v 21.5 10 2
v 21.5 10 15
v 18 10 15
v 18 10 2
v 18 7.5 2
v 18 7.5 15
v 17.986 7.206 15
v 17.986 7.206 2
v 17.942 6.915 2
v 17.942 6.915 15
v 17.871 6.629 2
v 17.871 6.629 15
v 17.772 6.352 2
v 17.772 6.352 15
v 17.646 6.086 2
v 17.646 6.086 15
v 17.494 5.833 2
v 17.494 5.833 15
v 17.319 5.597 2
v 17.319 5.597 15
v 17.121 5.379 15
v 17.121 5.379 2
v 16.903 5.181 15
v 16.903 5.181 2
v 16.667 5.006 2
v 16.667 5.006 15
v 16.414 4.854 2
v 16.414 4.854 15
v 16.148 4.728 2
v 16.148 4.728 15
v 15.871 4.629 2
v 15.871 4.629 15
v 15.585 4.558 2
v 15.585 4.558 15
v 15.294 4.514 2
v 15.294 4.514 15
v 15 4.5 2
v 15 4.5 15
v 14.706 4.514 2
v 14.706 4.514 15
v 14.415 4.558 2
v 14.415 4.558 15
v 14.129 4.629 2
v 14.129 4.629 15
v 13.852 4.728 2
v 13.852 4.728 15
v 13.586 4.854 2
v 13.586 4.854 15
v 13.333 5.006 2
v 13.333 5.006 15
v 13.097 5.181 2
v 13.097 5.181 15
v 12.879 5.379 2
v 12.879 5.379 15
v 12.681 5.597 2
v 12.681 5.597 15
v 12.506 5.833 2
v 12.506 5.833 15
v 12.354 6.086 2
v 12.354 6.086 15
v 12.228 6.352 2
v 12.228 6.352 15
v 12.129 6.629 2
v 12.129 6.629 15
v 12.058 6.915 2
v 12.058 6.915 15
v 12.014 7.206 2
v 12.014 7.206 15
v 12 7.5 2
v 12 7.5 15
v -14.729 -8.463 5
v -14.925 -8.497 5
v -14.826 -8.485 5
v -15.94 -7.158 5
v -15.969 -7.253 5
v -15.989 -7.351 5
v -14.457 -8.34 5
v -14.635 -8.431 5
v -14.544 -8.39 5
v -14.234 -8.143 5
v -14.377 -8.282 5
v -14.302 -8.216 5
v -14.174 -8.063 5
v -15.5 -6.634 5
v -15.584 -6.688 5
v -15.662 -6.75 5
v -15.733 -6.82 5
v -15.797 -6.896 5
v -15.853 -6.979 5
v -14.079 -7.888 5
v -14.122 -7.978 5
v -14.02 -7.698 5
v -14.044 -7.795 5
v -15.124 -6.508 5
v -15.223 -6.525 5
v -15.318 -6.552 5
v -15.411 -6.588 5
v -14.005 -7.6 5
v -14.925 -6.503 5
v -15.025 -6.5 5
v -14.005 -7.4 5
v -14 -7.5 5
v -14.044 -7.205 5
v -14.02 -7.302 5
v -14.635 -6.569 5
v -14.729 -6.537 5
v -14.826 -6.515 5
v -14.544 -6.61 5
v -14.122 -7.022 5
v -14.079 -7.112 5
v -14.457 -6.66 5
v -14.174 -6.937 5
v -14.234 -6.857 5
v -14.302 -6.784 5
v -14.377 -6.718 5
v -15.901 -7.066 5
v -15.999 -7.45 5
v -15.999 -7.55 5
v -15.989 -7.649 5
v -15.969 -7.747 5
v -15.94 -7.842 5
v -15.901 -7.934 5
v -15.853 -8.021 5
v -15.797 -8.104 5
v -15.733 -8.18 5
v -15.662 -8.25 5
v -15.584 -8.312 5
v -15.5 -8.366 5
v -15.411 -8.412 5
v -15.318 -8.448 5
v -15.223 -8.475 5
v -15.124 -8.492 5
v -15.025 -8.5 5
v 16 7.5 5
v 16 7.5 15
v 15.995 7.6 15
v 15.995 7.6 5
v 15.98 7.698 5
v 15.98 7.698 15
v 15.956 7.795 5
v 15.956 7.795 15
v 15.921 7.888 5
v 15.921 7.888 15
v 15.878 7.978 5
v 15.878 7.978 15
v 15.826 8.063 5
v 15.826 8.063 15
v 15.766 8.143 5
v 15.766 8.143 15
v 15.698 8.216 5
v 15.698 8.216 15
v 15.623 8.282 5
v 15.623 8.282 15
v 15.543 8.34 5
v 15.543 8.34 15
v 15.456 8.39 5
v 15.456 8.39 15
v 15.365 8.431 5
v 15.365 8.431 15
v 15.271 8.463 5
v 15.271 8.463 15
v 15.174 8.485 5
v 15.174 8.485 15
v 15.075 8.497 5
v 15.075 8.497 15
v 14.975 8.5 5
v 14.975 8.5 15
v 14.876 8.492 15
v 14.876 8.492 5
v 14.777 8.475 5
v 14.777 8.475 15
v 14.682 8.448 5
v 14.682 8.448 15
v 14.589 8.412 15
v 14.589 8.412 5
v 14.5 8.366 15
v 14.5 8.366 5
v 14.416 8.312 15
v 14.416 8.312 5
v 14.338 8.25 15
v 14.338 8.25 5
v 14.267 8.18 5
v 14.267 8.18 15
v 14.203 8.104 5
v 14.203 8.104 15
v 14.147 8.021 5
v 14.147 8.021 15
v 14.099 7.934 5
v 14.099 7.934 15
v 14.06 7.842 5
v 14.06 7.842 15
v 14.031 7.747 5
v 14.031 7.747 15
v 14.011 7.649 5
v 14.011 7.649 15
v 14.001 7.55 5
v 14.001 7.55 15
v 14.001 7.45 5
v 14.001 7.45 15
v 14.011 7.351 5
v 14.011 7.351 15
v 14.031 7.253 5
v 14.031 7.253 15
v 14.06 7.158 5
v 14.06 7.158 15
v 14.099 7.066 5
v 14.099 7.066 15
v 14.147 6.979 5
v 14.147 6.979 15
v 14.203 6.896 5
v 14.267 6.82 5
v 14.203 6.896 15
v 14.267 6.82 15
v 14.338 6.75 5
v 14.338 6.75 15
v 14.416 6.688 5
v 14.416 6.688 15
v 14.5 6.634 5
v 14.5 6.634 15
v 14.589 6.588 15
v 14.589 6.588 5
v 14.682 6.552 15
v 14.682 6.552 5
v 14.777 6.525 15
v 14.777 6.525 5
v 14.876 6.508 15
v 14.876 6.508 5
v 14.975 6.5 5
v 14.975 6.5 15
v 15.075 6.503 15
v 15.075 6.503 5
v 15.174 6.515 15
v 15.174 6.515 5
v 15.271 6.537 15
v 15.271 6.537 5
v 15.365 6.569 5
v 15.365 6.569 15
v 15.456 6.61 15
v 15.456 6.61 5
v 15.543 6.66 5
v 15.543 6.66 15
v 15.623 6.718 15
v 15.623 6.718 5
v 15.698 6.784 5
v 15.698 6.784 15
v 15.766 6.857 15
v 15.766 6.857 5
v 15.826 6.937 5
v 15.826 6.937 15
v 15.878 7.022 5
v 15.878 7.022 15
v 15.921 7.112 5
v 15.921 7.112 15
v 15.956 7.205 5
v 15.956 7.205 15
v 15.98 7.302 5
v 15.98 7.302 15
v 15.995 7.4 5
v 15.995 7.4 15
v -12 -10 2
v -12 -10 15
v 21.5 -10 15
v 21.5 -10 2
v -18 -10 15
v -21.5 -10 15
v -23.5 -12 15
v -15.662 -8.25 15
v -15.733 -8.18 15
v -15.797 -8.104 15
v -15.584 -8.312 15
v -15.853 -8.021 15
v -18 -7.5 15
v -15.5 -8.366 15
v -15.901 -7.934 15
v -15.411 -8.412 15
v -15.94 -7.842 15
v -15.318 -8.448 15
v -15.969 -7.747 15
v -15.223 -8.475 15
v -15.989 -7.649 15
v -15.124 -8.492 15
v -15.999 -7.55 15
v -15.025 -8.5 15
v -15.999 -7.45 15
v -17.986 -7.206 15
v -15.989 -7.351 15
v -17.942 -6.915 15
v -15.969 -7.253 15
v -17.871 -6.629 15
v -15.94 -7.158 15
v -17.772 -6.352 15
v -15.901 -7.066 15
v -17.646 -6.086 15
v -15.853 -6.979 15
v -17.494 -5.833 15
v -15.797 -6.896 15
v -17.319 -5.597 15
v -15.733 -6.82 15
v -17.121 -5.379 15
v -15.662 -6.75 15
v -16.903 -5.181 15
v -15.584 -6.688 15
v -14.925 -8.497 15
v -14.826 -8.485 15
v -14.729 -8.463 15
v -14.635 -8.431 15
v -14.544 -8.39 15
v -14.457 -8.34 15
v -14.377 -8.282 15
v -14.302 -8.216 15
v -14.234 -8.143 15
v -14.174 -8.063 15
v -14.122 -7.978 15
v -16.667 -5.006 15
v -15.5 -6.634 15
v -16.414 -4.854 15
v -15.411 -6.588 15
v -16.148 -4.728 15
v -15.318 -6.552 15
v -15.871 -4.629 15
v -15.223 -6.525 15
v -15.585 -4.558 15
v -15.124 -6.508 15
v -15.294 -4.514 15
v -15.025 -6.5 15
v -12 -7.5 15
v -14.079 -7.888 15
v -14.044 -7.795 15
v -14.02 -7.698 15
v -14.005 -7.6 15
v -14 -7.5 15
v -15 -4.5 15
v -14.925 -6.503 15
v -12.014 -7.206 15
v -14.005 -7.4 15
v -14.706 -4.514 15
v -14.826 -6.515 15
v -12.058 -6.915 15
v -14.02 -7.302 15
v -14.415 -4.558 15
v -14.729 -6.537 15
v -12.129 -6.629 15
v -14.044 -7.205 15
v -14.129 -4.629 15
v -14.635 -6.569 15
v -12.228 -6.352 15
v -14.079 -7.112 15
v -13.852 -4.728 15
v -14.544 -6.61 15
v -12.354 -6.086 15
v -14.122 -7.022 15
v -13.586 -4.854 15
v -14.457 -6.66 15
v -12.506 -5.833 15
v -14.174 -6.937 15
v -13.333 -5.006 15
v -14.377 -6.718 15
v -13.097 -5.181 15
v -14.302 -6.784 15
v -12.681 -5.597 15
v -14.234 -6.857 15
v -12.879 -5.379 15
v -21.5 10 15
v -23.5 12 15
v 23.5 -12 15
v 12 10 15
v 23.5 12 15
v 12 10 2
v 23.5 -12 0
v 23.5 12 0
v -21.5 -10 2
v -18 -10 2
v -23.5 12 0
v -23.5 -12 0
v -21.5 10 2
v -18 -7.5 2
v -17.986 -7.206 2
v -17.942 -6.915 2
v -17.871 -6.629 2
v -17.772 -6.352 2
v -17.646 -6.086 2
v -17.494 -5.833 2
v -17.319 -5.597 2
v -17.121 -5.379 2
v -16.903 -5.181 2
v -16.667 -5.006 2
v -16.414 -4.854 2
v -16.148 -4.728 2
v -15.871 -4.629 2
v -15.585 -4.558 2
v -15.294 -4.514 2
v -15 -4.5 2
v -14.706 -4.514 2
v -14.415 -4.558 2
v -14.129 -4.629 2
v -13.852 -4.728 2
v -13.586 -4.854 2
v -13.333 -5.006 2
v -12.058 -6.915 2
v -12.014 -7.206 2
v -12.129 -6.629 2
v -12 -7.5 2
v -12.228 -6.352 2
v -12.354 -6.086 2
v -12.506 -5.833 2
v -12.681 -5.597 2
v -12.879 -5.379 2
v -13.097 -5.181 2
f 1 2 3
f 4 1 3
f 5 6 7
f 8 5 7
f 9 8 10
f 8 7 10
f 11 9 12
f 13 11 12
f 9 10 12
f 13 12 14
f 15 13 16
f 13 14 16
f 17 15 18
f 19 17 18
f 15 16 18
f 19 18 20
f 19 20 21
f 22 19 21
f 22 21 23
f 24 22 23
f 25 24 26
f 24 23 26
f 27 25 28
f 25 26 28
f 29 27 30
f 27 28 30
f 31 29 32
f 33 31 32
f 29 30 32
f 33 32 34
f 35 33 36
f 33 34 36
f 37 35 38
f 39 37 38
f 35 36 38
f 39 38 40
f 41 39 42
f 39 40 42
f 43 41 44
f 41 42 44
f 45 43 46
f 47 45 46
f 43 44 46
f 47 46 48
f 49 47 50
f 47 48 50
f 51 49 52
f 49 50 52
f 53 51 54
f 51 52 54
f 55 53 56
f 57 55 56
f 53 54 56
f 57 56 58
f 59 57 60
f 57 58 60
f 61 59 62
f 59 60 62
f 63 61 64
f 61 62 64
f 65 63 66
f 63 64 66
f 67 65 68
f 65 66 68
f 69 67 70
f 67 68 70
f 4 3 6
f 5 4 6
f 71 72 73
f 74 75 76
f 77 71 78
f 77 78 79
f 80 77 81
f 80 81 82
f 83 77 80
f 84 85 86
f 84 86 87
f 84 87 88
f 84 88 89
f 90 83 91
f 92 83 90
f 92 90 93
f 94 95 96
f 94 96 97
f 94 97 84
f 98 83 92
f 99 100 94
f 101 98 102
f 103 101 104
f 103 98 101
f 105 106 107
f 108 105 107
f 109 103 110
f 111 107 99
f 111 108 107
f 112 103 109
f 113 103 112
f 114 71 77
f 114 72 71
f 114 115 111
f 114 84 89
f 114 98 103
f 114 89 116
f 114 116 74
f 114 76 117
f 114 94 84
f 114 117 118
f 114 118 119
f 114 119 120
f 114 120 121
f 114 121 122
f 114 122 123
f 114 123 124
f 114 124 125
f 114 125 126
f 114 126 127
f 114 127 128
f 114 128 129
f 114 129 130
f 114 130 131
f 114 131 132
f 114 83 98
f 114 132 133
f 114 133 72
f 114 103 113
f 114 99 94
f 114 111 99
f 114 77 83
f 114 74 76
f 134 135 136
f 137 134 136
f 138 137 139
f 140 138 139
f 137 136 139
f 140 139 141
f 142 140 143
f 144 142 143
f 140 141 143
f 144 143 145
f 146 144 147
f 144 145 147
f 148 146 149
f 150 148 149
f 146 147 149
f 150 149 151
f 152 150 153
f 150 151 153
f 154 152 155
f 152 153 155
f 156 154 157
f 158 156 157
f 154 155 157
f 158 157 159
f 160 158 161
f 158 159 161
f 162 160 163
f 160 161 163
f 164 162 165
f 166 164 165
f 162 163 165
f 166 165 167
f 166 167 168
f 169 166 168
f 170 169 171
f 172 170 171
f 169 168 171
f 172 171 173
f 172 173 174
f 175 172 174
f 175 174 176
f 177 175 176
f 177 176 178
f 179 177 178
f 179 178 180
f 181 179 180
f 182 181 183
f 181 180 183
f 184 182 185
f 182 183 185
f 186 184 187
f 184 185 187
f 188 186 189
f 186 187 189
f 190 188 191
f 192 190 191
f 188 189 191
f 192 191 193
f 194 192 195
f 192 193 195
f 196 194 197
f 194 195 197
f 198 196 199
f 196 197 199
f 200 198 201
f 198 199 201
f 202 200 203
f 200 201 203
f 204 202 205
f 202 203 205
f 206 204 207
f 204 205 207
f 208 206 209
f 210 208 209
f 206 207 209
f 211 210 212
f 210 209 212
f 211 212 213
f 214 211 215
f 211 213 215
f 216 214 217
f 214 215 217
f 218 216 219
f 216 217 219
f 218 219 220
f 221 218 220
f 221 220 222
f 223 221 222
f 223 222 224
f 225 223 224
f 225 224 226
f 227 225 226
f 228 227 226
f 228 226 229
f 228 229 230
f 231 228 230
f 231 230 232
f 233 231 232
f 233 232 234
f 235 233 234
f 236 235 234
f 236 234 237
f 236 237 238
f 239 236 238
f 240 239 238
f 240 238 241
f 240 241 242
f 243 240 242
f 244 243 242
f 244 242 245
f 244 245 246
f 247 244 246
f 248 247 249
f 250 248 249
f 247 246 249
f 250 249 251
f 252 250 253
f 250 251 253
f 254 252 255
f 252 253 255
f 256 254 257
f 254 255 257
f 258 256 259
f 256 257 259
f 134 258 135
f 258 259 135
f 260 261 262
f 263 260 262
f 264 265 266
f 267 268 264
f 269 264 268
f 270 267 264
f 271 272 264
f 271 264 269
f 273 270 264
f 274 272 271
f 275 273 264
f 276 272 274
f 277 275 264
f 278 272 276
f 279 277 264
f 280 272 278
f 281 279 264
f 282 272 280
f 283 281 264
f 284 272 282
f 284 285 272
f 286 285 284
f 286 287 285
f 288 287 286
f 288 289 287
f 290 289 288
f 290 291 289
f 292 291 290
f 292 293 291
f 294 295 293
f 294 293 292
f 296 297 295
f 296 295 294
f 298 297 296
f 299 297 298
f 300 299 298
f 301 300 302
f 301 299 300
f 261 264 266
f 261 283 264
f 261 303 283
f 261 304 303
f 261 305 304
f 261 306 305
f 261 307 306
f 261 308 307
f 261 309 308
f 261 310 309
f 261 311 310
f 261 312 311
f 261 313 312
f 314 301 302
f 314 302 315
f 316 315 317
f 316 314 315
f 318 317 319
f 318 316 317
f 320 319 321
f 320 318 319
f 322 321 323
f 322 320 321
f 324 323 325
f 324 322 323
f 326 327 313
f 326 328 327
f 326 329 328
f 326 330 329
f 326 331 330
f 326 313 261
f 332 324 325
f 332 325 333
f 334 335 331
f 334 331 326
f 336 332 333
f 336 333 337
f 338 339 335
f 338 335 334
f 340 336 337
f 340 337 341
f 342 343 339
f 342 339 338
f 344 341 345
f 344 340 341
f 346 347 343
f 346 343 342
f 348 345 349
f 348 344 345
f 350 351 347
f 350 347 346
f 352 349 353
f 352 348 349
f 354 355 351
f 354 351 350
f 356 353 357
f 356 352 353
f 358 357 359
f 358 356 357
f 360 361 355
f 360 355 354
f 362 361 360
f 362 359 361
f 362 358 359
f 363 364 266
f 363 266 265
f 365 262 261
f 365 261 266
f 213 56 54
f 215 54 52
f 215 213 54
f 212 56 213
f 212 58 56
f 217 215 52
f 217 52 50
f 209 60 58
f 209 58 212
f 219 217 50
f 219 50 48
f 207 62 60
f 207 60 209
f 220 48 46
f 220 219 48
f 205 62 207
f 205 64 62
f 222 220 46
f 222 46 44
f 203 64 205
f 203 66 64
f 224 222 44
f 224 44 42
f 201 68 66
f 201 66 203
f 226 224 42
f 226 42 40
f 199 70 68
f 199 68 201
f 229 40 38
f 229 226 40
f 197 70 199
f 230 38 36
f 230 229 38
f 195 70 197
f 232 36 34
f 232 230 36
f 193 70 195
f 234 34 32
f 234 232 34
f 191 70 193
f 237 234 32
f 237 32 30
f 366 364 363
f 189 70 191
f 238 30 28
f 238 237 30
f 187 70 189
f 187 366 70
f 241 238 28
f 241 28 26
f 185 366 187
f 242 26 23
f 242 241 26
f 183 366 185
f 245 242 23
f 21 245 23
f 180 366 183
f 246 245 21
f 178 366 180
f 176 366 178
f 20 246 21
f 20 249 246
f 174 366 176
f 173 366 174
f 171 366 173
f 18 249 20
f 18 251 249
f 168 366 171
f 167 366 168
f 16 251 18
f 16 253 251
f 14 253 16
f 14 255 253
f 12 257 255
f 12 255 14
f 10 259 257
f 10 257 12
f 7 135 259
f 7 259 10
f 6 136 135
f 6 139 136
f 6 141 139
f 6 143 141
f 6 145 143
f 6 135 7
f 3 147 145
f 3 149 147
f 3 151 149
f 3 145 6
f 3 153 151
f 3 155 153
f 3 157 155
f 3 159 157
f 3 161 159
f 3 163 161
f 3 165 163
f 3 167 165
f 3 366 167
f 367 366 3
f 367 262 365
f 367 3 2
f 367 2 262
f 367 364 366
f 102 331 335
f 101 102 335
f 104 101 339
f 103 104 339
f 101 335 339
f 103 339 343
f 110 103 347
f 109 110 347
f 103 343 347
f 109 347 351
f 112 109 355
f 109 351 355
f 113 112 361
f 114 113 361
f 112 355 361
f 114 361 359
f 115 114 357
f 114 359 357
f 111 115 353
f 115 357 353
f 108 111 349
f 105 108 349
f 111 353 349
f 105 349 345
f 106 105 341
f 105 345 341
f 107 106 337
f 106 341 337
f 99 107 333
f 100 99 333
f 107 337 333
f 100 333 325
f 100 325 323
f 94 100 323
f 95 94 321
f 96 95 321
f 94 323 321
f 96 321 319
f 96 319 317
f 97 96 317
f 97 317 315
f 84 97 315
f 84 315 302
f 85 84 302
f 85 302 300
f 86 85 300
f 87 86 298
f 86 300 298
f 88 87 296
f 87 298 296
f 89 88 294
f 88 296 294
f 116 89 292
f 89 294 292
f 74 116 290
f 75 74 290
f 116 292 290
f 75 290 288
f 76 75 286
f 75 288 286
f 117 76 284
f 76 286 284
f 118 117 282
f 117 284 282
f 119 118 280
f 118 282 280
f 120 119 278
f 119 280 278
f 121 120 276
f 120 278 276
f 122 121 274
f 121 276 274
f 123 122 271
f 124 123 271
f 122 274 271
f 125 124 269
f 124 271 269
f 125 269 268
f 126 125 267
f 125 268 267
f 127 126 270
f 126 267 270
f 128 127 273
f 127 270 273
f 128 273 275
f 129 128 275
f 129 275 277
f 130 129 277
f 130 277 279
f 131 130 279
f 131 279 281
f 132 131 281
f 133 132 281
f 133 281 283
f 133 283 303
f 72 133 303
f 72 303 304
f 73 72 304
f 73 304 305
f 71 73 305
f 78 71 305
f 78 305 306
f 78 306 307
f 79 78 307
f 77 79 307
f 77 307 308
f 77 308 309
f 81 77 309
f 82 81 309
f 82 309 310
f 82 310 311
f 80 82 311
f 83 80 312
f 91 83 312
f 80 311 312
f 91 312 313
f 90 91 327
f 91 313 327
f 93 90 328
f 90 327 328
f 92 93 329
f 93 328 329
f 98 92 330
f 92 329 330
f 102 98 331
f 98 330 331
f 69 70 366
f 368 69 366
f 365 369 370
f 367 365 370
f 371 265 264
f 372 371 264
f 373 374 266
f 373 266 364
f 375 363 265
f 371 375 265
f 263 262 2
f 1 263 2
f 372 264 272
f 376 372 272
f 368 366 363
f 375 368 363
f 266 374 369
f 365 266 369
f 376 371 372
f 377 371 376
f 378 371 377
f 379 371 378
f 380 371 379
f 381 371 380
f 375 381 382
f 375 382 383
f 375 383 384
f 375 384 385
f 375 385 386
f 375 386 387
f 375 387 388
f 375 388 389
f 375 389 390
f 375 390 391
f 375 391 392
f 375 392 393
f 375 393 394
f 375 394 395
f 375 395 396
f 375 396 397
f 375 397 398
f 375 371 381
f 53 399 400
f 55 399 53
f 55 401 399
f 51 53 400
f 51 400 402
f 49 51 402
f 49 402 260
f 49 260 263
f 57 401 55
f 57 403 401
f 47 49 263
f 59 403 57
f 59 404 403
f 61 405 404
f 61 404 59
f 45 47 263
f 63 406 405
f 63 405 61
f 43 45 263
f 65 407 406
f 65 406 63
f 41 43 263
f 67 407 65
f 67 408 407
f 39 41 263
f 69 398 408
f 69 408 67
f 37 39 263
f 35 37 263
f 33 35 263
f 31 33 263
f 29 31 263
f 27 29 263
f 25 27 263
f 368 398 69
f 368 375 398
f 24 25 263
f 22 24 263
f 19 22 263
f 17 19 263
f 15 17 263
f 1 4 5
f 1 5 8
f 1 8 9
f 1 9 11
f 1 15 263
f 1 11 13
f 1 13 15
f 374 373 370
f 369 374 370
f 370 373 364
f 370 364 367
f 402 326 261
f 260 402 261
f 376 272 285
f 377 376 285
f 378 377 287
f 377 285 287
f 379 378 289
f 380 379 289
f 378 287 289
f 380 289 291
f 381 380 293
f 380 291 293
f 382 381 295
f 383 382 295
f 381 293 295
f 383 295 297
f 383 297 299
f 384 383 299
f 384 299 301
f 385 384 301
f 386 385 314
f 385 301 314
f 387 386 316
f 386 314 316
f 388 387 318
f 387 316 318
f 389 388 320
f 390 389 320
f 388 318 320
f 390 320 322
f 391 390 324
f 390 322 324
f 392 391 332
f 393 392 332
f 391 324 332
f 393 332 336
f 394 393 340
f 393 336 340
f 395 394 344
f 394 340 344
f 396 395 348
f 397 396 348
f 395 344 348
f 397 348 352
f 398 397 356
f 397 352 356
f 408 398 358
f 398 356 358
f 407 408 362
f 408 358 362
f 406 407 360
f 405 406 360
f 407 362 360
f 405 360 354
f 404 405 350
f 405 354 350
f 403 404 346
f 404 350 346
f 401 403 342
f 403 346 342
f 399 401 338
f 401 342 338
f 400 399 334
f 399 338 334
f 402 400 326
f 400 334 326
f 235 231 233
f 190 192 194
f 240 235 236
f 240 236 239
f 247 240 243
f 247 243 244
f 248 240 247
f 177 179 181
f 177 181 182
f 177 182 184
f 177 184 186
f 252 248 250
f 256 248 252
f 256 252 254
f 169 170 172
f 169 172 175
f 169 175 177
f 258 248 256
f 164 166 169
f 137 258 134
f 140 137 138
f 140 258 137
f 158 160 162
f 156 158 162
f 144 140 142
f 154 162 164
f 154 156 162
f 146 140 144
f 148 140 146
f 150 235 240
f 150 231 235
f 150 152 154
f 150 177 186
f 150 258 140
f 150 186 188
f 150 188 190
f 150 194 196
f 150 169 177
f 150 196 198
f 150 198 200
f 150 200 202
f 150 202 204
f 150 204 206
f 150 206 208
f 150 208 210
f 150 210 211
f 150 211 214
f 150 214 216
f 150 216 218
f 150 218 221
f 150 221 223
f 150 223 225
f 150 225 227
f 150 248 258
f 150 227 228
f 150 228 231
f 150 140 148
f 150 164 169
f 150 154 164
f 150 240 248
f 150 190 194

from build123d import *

# Parameters (mm, degrees)
F0_W     = 47
F0_H     = 24
F1_DEPTH = 15
F3_DEPTH = 13
F4_R     = 1
F5_DEPTH = 10


with BuildPart() as f1:
    # F0 (on Top) → F1 (new body)
    with BuildSketch(Plane.XY):
        Rectangle(F0_W, F0_H)
    extrude(amount=F1_DEPTH)

    # F2 (on face) → F3 (cut)
    with BuildSketch(Plane.XY.offset(15)):
        with BuildLine():
            Line((21.5, 10), (18, 10))
            Line((18, 10), (18, 7.5))
            ThreePointArc((18, 7.5), (15, 4.5), (12, 7.5))
            Line((12, 7.5), (12, 10))
            Line((12, 10), (-21.5, 10))
            Line((-21.5, 10), (-21.5, -10))
            Line((-21.5, -10), (-18, -10))
            Line((-18, -10), (-18, -7.5))
            ThreePointArc((-18, -7.5), (-15, -4.5), (-12, -7.5))
            Line((-12, -7.5), (-12, -10))
            Line((-12, -10), (21.5, -10))
            Line((21.5, -10), (21.5, 10))
        make_face()
    extrude(amount=-F3_DEPTH, mode=Mode.SUBTRACT)

    # F4 (on face) → F5 (cut)
    with BuildSketch(Plane.XY.offset(15)):
        with Locations((15, 7.5)):
            Circle(F4_R)
        with Locations((-15, -7.5)):
            Circle(F4_R)
    extrude(amount=-F5_DEPTH, mode=Mode.SUBTRACT)


solid = f1.part
